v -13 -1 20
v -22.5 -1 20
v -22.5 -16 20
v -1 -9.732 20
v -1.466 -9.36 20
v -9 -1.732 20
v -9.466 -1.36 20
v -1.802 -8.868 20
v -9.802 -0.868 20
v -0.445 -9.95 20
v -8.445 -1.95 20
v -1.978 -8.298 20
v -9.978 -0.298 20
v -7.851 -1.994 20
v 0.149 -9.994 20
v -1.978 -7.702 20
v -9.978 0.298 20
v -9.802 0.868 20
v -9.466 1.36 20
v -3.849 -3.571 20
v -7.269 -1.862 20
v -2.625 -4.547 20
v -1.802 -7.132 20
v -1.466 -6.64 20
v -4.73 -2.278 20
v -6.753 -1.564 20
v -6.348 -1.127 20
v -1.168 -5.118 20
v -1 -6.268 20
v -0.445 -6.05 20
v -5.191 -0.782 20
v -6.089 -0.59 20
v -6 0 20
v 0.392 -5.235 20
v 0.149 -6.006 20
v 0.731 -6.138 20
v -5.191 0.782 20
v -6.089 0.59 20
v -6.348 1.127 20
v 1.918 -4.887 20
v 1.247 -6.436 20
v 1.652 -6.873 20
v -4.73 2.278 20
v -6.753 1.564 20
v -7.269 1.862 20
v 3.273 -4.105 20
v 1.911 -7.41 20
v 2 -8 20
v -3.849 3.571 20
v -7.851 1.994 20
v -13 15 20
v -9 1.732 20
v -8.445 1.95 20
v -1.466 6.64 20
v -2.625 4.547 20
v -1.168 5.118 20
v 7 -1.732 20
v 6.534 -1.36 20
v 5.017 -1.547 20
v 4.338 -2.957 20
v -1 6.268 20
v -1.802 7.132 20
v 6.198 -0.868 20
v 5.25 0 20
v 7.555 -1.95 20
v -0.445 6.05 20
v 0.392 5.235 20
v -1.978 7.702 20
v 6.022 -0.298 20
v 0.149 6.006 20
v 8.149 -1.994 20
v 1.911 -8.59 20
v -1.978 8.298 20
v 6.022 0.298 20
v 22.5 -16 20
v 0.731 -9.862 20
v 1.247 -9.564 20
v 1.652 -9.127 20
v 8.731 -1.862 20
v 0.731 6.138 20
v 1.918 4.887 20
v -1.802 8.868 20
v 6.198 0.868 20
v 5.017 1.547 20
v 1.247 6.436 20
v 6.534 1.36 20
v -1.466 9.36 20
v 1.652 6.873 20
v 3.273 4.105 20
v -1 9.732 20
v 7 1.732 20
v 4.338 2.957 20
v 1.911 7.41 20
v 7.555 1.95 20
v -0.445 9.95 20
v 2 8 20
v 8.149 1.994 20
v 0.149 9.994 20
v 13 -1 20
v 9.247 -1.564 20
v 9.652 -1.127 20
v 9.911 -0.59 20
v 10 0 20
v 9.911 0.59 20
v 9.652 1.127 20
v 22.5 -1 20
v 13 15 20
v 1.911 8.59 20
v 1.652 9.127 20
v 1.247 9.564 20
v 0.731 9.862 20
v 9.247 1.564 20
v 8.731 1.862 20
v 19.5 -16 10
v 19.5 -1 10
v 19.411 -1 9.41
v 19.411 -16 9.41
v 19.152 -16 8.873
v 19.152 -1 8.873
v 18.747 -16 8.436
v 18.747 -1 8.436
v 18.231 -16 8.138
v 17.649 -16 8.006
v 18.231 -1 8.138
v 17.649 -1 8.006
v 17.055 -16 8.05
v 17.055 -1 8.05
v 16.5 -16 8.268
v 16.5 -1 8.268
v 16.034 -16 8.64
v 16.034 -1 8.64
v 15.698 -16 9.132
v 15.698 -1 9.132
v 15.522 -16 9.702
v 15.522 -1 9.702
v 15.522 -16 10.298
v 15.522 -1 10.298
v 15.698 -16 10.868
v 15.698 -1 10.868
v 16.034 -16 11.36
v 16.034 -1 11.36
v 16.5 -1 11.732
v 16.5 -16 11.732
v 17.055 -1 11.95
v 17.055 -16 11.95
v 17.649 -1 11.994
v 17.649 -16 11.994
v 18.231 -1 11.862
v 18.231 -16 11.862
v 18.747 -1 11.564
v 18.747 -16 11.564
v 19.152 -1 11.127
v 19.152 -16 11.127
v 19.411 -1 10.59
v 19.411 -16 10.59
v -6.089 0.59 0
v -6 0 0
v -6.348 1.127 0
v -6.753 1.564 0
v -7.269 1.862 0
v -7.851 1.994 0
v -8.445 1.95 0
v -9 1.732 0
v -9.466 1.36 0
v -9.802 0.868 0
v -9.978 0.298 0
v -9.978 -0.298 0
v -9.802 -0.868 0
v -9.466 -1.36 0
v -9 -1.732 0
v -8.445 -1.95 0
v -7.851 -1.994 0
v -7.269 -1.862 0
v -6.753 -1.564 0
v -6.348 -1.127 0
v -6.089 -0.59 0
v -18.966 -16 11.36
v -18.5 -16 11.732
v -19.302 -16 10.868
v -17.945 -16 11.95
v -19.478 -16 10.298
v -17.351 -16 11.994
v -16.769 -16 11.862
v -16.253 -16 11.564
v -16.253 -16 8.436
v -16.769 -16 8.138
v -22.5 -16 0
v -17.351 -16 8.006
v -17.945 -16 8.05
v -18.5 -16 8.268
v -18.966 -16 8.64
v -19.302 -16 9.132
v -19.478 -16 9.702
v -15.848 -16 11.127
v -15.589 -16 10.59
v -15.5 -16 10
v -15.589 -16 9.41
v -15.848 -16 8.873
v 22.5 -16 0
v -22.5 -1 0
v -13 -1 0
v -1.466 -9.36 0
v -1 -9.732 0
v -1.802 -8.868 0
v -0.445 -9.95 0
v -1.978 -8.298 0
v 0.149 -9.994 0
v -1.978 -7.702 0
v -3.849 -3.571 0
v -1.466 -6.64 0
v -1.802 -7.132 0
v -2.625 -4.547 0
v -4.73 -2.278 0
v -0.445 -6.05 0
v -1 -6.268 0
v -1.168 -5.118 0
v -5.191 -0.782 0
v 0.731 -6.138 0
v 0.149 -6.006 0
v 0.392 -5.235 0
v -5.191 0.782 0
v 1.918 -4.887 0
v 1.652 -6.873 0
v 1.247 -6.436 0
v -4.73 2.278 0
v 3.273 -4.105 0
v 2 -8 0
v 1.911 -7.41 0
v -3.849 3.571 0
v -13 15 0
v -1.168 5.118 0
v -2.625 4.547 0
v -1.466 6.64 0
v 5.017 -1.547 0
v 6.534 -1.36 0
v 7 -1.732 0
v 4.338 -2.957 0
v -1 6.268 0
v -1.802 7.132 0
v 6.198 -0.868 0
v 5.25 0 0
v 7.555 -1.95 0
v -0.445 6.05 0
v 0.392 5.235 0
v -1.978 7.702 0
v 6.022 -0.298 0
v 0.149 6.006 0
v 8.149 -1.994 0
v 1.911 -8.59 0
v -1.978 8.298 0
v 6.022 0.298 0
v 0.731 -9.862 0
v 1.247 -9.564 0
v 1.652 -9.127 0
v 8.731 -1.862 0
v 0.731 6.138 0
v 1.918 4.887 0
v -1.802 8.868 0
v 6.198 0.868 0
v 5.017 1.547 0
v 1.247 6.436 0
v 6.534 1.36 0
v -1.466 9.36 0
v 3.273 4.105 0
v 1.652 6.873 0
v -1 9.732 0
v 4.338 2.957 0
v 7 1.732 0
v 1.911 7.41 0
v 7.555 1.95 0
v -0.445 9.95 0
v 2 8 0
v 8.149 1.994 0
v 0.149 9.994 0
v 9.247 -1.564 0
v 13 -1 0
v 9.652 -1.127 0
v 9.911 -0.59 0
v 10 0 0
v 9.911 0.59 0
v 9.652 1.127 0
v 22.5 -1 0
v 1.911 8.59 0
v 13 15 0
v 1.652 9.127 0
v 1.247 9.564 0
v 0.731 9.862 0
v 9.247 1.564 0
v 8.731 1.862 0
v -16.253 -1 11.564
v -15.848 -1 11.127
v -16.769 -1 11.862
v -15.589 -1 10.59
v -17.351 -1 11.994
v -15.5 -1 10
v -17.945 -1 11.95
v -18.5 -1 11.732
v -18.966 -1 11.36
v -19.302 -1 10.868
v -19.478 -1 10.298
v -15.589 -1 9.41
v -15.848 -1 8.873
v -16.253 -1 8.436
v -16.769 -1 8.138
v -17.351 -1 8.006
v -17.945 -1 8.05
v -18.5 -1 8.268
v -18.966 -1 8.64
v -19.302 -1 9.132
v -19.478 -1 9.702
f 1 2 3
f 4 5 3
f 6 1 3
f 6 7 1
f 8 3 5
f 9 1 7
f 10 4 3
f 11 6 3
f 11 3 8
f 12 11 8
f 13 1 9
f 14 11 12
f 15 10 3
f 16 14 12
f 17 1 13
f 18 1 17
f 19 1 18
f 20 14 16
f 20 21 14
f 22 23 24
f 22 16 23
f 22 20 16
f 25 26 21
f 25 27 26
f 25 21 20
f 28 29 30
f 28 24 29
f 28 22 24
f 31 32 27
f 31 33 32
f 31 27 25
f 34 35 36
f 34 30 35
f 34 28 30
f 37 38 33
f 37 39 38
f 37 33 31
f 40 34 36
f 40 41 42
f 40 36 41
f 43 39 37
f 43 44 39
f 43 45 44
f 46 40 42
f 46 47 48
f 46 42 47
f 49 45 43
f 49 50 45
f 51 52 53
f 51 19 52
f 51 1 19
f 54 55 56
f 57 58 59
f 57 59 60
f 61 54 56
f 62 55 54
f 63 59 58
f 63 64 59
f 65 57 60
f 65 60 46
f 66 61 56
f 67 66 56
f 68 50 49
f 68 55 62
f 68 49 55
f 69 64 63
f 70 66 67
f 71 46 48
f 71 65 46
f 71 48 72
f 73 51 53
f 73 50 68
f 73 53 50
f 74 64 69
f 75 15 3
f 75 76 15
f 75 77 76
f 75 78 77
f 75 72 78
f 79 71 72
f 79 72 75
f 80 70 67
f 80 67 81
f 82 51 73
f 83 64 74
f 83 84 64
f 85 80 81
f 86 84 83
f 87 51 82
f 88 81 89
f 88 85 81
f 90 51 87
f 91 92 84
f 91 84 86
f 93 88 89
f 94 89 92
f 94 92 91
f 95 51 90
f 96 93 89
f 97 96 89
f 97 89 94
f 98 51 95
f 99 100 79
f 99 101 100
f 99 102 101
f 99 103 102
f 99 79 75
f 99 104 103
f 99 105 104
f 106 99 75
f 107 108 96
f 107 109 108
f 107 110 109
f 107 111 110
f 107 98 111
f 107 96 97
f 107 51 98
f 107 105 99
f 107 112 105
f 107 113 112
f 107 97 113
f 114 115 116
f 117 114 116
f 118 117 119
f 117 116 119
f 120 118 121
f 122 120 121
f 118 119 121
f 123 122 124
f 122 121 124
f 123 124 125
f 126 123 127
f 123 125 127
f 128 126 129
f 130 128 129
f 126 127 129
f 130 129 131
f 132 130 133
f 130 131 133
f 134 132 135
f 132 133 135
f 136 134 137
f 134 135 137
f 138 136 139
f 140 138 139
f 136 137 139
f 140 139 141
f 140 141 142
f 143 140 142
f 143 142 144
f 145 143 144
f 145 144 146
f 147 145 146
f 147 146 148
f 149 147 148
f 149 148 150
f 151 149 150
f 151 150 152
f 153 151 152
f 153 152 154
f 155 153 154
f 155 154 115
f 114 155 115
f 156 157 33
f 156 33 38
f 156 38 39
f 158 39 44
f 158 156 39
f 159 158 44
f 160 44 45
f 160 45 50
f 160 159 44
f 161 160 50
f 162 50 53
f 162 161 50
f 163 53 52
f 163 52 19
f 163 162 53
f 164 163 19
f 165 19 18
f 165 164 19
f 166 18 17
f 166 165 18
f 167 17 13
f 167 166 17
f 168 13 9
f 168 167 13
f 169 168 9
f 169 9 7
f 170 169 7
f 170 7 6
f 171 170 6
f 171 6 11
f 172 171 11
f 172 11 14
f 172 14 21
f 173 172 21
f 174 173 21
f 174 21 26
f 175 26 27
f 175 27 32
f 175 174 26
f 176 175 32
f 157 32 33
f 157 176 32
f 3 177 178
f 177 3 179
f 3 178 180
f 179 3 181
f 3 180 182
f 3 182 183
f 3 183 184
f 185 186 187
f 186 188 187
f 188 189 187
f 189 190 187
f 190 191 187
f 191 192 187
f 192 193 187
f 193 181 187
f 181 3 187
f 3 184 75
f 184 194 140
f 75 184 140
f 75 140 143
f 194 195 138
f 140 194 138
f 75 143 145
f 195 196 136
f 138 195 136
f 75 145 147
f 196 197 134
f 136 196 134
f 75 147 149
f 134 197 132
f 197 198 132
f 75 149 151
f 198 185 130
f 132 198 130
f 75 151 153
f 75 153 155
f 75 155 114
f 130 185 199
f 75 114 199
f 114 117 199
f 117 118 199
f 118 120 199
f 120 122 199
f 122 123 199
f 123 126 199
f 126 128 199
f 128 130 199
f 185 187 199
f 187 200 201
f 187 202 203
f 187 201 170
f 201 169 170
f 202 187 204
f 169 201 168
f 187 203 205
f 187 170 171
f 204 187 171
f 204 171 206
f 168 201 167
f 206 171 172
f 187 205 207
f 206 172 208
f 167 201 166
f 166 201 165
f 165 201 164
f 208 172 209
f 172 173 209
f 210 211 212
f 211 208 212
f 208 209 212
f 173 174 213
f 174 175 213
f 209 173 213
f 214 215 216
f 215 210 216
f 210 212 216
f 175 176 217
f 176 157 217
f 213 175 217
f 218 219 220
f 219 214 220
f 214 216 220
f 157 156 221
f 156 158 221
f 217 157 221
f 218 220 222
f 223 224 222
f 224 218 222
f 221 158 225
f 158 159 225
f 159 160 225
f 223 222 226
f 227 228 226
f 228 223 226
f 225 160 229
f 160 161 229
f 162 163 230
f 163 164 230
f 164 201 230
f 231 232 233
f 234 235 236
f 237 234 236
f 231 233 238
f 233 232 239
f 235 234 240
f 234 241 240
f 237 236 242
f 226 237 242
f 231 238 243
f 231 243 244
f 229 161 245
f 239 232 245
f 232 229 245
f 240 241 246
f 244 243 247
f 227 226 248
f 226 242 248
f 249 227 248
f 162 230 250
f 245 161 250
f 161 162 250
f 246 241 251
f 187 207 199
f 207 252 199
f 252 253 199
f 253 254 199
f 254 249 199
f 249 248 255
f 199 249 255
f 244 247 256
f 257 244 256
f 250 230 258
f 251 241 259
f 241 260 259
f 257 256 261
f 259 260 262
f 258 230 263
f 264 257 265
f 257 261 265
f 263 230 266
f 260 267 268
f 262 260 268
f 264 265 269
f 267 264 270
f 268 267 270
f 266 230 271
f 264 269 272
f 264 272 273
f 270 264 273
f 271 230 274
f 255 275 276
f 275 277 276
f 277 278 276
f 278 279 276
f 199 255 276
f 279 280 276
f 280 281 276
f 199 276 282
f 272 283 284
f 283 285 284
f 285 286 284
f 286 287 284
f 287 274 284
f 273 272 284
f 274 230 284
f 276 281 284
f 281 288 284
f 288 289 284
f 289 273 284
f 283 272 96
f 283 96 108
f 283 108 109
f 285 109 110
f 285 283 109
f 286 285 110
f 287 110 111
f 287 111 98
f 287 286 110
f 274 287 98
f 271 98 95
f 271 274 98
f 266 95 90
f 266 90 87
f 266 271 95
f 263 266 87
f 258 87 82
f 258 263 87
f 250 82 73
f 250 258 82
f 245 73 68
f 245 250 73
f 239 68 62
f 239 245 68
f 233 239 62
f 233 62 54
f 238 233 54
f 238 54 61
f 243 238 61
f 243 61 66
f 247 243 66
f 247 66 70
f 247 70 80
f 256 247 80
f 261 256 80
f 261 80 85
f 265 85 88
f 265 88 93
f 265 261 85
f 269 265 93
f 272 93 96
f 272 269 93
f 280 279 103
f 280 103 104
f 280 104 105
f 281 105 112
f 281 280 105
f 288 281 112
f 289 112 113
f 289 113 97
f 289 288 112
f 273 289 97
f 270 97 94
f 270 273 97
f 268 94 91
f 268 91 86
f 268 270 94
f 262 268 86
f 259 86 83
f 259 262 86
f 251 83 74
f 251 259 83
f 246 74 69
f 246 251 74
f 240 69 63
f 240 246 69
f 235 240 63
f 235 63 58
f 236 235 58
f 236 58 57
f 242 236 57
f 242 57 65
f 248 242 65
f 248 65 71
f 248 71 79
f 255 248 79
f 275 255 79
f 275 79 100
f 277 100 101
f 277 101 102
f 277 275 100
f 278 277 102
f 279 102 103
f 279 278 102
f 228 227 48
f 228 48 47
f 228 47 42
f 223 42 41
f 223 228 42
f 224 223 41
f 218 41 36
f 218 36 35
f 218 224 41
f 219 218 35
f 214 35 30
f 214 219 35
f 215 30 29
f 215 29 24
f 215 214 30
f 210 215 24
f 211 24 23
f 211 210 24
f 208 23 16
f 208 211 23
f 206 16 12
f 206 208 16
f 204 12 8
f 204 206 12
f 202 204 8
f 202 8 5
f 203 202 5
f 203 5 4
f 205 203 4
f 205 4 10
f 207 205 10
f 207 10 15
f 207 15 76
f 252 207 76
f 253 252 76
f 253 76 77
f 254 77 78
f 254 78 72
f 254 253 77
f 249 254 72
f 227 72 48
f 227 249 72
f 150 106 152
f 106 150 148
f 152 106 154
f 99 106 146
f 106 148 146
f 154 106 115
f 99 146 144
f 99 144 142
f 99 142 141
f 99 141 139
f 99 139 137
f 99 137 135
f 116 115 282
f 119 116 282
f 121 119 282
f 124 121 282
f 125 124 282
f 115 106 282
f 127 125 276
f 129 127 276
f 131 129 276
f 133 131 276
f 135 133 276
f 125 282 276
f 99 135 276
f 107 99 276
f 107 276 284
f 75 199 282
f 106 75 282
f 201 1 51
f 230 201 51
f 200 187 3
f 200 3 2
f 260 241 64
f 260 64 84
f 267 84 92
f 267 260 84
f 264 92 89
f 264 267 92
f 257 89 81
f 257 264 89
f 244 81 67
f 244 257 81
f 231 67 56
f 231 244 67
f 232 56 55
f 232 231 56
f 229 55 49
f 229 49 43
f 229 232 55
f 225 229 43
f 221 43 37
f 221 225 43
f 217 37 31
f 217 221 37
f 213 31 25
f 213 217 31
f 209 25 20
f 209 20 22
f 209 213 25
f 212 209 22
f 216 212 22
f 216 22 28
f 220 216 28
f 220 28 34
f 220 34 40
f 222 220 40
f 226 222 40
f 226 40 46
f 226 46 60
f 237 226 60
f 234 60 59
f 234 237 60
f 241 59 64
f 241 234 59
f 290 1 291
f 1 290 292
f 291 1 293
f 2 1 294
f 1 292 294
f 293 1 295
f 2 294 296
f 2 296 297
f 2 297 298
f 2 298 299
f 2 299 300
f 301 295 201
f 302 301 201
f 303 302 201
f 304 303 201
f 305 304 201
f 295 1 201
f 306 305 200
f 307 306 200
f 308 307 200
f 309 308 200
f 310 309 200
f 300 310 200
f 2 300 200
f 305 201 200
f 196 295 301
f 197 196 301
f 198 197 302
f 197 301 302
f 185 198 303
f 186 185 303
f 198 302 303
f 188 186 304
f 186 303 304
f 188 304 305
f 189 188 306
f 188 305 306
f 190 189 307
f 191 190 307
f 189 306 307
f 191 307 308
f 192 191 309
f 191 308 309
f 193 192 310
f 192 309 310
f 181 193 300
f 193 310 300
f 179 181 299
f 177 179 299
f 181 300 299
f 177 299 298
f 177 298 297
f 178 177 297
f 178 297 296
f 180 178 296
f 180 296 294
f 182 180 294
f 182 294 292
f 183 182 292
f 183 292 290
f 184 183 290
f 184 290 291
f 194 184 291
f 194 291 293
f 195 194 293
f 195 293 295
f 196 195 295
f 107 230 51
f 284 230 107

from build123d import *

# Parameters (mm, degrees)
SKETCH1_W           = 45
SKETCH1_H           = 31
SKETCH1_R           = 5.25
SKETCH1_R_2         = 2
BOSS_EXTRUDE1_DEPTH = 20
SKETCH2_R           = 2
CUT_EXTRUDE1_DEPTH  = 32
SKETCH3_W           = 9.5
SKETCH3_H           = 16
CUT_EXTRUDE2_DEPTH  = 21


with BuildPart() as part:
    # Sketch1 → Boss-Extrude1 (new body)
    with BuildSketch(Plane.XY):
        with Locations((0, -0.5)):
            Rectangle(SKETCH1_W, SKETCH1_H)
        Circle(SKETCH1_R, mode=Mode.SUBTRACT)
        with Locations((0, 8)):
            Circle(SKETCH1_R_2, mode=Mode.SUBTRACT)
        with Locations((8, 0)):
            Circle(SKETCH1_R_2, mode=Mode.SUBTRACT)
        with Locations((0, -8)):
            Circle(SKETCH1_R_2, mode=Mode.SUBTRACT)
        with Locations((-8, 0)):
            Circle(SKETCH1_R_2, mode=Mode.SUBTRACT)
    extrude(amount=BOSS_EXTRUDE1_DEPTH)

    # Sketch2 → Cut-Extrude1 (cut, through all)
    with BuildSketch(Plane(origin=(0, 15, 0), x_dir=(1, 0, 0), z_dir=(0, 1, 0))):
        with Locations((-17.5, -10)):
            Circle(SKETCH2_R)
        with Locations((17.5, -10)):
            Circle(SKETCH2_R)
    extrude(amount=-CUT_EXTRUDE1_DEPTH, mode=Mode.SUBTRACT)

    # Sketch3 → Cut-Extrude2 (cut, through all)
    with BuildSketch(Plane(origin=(0, 0, 0), x_dir=(-1, 0, 0), z_dir=(0, 0, -1))):
        with Locations((17.75, 7)):
            Rectangle(SKETCH3_W, SKETCH3_H)
        with Locations((-17.75, 7)):
            Rectangle(SKETCH3_W, SKETCH3_H)
    extrude(amount=-CUT_EXTRUDE2_DEPTH, mode=Mode.SUBTRACT)


solid = part.part
